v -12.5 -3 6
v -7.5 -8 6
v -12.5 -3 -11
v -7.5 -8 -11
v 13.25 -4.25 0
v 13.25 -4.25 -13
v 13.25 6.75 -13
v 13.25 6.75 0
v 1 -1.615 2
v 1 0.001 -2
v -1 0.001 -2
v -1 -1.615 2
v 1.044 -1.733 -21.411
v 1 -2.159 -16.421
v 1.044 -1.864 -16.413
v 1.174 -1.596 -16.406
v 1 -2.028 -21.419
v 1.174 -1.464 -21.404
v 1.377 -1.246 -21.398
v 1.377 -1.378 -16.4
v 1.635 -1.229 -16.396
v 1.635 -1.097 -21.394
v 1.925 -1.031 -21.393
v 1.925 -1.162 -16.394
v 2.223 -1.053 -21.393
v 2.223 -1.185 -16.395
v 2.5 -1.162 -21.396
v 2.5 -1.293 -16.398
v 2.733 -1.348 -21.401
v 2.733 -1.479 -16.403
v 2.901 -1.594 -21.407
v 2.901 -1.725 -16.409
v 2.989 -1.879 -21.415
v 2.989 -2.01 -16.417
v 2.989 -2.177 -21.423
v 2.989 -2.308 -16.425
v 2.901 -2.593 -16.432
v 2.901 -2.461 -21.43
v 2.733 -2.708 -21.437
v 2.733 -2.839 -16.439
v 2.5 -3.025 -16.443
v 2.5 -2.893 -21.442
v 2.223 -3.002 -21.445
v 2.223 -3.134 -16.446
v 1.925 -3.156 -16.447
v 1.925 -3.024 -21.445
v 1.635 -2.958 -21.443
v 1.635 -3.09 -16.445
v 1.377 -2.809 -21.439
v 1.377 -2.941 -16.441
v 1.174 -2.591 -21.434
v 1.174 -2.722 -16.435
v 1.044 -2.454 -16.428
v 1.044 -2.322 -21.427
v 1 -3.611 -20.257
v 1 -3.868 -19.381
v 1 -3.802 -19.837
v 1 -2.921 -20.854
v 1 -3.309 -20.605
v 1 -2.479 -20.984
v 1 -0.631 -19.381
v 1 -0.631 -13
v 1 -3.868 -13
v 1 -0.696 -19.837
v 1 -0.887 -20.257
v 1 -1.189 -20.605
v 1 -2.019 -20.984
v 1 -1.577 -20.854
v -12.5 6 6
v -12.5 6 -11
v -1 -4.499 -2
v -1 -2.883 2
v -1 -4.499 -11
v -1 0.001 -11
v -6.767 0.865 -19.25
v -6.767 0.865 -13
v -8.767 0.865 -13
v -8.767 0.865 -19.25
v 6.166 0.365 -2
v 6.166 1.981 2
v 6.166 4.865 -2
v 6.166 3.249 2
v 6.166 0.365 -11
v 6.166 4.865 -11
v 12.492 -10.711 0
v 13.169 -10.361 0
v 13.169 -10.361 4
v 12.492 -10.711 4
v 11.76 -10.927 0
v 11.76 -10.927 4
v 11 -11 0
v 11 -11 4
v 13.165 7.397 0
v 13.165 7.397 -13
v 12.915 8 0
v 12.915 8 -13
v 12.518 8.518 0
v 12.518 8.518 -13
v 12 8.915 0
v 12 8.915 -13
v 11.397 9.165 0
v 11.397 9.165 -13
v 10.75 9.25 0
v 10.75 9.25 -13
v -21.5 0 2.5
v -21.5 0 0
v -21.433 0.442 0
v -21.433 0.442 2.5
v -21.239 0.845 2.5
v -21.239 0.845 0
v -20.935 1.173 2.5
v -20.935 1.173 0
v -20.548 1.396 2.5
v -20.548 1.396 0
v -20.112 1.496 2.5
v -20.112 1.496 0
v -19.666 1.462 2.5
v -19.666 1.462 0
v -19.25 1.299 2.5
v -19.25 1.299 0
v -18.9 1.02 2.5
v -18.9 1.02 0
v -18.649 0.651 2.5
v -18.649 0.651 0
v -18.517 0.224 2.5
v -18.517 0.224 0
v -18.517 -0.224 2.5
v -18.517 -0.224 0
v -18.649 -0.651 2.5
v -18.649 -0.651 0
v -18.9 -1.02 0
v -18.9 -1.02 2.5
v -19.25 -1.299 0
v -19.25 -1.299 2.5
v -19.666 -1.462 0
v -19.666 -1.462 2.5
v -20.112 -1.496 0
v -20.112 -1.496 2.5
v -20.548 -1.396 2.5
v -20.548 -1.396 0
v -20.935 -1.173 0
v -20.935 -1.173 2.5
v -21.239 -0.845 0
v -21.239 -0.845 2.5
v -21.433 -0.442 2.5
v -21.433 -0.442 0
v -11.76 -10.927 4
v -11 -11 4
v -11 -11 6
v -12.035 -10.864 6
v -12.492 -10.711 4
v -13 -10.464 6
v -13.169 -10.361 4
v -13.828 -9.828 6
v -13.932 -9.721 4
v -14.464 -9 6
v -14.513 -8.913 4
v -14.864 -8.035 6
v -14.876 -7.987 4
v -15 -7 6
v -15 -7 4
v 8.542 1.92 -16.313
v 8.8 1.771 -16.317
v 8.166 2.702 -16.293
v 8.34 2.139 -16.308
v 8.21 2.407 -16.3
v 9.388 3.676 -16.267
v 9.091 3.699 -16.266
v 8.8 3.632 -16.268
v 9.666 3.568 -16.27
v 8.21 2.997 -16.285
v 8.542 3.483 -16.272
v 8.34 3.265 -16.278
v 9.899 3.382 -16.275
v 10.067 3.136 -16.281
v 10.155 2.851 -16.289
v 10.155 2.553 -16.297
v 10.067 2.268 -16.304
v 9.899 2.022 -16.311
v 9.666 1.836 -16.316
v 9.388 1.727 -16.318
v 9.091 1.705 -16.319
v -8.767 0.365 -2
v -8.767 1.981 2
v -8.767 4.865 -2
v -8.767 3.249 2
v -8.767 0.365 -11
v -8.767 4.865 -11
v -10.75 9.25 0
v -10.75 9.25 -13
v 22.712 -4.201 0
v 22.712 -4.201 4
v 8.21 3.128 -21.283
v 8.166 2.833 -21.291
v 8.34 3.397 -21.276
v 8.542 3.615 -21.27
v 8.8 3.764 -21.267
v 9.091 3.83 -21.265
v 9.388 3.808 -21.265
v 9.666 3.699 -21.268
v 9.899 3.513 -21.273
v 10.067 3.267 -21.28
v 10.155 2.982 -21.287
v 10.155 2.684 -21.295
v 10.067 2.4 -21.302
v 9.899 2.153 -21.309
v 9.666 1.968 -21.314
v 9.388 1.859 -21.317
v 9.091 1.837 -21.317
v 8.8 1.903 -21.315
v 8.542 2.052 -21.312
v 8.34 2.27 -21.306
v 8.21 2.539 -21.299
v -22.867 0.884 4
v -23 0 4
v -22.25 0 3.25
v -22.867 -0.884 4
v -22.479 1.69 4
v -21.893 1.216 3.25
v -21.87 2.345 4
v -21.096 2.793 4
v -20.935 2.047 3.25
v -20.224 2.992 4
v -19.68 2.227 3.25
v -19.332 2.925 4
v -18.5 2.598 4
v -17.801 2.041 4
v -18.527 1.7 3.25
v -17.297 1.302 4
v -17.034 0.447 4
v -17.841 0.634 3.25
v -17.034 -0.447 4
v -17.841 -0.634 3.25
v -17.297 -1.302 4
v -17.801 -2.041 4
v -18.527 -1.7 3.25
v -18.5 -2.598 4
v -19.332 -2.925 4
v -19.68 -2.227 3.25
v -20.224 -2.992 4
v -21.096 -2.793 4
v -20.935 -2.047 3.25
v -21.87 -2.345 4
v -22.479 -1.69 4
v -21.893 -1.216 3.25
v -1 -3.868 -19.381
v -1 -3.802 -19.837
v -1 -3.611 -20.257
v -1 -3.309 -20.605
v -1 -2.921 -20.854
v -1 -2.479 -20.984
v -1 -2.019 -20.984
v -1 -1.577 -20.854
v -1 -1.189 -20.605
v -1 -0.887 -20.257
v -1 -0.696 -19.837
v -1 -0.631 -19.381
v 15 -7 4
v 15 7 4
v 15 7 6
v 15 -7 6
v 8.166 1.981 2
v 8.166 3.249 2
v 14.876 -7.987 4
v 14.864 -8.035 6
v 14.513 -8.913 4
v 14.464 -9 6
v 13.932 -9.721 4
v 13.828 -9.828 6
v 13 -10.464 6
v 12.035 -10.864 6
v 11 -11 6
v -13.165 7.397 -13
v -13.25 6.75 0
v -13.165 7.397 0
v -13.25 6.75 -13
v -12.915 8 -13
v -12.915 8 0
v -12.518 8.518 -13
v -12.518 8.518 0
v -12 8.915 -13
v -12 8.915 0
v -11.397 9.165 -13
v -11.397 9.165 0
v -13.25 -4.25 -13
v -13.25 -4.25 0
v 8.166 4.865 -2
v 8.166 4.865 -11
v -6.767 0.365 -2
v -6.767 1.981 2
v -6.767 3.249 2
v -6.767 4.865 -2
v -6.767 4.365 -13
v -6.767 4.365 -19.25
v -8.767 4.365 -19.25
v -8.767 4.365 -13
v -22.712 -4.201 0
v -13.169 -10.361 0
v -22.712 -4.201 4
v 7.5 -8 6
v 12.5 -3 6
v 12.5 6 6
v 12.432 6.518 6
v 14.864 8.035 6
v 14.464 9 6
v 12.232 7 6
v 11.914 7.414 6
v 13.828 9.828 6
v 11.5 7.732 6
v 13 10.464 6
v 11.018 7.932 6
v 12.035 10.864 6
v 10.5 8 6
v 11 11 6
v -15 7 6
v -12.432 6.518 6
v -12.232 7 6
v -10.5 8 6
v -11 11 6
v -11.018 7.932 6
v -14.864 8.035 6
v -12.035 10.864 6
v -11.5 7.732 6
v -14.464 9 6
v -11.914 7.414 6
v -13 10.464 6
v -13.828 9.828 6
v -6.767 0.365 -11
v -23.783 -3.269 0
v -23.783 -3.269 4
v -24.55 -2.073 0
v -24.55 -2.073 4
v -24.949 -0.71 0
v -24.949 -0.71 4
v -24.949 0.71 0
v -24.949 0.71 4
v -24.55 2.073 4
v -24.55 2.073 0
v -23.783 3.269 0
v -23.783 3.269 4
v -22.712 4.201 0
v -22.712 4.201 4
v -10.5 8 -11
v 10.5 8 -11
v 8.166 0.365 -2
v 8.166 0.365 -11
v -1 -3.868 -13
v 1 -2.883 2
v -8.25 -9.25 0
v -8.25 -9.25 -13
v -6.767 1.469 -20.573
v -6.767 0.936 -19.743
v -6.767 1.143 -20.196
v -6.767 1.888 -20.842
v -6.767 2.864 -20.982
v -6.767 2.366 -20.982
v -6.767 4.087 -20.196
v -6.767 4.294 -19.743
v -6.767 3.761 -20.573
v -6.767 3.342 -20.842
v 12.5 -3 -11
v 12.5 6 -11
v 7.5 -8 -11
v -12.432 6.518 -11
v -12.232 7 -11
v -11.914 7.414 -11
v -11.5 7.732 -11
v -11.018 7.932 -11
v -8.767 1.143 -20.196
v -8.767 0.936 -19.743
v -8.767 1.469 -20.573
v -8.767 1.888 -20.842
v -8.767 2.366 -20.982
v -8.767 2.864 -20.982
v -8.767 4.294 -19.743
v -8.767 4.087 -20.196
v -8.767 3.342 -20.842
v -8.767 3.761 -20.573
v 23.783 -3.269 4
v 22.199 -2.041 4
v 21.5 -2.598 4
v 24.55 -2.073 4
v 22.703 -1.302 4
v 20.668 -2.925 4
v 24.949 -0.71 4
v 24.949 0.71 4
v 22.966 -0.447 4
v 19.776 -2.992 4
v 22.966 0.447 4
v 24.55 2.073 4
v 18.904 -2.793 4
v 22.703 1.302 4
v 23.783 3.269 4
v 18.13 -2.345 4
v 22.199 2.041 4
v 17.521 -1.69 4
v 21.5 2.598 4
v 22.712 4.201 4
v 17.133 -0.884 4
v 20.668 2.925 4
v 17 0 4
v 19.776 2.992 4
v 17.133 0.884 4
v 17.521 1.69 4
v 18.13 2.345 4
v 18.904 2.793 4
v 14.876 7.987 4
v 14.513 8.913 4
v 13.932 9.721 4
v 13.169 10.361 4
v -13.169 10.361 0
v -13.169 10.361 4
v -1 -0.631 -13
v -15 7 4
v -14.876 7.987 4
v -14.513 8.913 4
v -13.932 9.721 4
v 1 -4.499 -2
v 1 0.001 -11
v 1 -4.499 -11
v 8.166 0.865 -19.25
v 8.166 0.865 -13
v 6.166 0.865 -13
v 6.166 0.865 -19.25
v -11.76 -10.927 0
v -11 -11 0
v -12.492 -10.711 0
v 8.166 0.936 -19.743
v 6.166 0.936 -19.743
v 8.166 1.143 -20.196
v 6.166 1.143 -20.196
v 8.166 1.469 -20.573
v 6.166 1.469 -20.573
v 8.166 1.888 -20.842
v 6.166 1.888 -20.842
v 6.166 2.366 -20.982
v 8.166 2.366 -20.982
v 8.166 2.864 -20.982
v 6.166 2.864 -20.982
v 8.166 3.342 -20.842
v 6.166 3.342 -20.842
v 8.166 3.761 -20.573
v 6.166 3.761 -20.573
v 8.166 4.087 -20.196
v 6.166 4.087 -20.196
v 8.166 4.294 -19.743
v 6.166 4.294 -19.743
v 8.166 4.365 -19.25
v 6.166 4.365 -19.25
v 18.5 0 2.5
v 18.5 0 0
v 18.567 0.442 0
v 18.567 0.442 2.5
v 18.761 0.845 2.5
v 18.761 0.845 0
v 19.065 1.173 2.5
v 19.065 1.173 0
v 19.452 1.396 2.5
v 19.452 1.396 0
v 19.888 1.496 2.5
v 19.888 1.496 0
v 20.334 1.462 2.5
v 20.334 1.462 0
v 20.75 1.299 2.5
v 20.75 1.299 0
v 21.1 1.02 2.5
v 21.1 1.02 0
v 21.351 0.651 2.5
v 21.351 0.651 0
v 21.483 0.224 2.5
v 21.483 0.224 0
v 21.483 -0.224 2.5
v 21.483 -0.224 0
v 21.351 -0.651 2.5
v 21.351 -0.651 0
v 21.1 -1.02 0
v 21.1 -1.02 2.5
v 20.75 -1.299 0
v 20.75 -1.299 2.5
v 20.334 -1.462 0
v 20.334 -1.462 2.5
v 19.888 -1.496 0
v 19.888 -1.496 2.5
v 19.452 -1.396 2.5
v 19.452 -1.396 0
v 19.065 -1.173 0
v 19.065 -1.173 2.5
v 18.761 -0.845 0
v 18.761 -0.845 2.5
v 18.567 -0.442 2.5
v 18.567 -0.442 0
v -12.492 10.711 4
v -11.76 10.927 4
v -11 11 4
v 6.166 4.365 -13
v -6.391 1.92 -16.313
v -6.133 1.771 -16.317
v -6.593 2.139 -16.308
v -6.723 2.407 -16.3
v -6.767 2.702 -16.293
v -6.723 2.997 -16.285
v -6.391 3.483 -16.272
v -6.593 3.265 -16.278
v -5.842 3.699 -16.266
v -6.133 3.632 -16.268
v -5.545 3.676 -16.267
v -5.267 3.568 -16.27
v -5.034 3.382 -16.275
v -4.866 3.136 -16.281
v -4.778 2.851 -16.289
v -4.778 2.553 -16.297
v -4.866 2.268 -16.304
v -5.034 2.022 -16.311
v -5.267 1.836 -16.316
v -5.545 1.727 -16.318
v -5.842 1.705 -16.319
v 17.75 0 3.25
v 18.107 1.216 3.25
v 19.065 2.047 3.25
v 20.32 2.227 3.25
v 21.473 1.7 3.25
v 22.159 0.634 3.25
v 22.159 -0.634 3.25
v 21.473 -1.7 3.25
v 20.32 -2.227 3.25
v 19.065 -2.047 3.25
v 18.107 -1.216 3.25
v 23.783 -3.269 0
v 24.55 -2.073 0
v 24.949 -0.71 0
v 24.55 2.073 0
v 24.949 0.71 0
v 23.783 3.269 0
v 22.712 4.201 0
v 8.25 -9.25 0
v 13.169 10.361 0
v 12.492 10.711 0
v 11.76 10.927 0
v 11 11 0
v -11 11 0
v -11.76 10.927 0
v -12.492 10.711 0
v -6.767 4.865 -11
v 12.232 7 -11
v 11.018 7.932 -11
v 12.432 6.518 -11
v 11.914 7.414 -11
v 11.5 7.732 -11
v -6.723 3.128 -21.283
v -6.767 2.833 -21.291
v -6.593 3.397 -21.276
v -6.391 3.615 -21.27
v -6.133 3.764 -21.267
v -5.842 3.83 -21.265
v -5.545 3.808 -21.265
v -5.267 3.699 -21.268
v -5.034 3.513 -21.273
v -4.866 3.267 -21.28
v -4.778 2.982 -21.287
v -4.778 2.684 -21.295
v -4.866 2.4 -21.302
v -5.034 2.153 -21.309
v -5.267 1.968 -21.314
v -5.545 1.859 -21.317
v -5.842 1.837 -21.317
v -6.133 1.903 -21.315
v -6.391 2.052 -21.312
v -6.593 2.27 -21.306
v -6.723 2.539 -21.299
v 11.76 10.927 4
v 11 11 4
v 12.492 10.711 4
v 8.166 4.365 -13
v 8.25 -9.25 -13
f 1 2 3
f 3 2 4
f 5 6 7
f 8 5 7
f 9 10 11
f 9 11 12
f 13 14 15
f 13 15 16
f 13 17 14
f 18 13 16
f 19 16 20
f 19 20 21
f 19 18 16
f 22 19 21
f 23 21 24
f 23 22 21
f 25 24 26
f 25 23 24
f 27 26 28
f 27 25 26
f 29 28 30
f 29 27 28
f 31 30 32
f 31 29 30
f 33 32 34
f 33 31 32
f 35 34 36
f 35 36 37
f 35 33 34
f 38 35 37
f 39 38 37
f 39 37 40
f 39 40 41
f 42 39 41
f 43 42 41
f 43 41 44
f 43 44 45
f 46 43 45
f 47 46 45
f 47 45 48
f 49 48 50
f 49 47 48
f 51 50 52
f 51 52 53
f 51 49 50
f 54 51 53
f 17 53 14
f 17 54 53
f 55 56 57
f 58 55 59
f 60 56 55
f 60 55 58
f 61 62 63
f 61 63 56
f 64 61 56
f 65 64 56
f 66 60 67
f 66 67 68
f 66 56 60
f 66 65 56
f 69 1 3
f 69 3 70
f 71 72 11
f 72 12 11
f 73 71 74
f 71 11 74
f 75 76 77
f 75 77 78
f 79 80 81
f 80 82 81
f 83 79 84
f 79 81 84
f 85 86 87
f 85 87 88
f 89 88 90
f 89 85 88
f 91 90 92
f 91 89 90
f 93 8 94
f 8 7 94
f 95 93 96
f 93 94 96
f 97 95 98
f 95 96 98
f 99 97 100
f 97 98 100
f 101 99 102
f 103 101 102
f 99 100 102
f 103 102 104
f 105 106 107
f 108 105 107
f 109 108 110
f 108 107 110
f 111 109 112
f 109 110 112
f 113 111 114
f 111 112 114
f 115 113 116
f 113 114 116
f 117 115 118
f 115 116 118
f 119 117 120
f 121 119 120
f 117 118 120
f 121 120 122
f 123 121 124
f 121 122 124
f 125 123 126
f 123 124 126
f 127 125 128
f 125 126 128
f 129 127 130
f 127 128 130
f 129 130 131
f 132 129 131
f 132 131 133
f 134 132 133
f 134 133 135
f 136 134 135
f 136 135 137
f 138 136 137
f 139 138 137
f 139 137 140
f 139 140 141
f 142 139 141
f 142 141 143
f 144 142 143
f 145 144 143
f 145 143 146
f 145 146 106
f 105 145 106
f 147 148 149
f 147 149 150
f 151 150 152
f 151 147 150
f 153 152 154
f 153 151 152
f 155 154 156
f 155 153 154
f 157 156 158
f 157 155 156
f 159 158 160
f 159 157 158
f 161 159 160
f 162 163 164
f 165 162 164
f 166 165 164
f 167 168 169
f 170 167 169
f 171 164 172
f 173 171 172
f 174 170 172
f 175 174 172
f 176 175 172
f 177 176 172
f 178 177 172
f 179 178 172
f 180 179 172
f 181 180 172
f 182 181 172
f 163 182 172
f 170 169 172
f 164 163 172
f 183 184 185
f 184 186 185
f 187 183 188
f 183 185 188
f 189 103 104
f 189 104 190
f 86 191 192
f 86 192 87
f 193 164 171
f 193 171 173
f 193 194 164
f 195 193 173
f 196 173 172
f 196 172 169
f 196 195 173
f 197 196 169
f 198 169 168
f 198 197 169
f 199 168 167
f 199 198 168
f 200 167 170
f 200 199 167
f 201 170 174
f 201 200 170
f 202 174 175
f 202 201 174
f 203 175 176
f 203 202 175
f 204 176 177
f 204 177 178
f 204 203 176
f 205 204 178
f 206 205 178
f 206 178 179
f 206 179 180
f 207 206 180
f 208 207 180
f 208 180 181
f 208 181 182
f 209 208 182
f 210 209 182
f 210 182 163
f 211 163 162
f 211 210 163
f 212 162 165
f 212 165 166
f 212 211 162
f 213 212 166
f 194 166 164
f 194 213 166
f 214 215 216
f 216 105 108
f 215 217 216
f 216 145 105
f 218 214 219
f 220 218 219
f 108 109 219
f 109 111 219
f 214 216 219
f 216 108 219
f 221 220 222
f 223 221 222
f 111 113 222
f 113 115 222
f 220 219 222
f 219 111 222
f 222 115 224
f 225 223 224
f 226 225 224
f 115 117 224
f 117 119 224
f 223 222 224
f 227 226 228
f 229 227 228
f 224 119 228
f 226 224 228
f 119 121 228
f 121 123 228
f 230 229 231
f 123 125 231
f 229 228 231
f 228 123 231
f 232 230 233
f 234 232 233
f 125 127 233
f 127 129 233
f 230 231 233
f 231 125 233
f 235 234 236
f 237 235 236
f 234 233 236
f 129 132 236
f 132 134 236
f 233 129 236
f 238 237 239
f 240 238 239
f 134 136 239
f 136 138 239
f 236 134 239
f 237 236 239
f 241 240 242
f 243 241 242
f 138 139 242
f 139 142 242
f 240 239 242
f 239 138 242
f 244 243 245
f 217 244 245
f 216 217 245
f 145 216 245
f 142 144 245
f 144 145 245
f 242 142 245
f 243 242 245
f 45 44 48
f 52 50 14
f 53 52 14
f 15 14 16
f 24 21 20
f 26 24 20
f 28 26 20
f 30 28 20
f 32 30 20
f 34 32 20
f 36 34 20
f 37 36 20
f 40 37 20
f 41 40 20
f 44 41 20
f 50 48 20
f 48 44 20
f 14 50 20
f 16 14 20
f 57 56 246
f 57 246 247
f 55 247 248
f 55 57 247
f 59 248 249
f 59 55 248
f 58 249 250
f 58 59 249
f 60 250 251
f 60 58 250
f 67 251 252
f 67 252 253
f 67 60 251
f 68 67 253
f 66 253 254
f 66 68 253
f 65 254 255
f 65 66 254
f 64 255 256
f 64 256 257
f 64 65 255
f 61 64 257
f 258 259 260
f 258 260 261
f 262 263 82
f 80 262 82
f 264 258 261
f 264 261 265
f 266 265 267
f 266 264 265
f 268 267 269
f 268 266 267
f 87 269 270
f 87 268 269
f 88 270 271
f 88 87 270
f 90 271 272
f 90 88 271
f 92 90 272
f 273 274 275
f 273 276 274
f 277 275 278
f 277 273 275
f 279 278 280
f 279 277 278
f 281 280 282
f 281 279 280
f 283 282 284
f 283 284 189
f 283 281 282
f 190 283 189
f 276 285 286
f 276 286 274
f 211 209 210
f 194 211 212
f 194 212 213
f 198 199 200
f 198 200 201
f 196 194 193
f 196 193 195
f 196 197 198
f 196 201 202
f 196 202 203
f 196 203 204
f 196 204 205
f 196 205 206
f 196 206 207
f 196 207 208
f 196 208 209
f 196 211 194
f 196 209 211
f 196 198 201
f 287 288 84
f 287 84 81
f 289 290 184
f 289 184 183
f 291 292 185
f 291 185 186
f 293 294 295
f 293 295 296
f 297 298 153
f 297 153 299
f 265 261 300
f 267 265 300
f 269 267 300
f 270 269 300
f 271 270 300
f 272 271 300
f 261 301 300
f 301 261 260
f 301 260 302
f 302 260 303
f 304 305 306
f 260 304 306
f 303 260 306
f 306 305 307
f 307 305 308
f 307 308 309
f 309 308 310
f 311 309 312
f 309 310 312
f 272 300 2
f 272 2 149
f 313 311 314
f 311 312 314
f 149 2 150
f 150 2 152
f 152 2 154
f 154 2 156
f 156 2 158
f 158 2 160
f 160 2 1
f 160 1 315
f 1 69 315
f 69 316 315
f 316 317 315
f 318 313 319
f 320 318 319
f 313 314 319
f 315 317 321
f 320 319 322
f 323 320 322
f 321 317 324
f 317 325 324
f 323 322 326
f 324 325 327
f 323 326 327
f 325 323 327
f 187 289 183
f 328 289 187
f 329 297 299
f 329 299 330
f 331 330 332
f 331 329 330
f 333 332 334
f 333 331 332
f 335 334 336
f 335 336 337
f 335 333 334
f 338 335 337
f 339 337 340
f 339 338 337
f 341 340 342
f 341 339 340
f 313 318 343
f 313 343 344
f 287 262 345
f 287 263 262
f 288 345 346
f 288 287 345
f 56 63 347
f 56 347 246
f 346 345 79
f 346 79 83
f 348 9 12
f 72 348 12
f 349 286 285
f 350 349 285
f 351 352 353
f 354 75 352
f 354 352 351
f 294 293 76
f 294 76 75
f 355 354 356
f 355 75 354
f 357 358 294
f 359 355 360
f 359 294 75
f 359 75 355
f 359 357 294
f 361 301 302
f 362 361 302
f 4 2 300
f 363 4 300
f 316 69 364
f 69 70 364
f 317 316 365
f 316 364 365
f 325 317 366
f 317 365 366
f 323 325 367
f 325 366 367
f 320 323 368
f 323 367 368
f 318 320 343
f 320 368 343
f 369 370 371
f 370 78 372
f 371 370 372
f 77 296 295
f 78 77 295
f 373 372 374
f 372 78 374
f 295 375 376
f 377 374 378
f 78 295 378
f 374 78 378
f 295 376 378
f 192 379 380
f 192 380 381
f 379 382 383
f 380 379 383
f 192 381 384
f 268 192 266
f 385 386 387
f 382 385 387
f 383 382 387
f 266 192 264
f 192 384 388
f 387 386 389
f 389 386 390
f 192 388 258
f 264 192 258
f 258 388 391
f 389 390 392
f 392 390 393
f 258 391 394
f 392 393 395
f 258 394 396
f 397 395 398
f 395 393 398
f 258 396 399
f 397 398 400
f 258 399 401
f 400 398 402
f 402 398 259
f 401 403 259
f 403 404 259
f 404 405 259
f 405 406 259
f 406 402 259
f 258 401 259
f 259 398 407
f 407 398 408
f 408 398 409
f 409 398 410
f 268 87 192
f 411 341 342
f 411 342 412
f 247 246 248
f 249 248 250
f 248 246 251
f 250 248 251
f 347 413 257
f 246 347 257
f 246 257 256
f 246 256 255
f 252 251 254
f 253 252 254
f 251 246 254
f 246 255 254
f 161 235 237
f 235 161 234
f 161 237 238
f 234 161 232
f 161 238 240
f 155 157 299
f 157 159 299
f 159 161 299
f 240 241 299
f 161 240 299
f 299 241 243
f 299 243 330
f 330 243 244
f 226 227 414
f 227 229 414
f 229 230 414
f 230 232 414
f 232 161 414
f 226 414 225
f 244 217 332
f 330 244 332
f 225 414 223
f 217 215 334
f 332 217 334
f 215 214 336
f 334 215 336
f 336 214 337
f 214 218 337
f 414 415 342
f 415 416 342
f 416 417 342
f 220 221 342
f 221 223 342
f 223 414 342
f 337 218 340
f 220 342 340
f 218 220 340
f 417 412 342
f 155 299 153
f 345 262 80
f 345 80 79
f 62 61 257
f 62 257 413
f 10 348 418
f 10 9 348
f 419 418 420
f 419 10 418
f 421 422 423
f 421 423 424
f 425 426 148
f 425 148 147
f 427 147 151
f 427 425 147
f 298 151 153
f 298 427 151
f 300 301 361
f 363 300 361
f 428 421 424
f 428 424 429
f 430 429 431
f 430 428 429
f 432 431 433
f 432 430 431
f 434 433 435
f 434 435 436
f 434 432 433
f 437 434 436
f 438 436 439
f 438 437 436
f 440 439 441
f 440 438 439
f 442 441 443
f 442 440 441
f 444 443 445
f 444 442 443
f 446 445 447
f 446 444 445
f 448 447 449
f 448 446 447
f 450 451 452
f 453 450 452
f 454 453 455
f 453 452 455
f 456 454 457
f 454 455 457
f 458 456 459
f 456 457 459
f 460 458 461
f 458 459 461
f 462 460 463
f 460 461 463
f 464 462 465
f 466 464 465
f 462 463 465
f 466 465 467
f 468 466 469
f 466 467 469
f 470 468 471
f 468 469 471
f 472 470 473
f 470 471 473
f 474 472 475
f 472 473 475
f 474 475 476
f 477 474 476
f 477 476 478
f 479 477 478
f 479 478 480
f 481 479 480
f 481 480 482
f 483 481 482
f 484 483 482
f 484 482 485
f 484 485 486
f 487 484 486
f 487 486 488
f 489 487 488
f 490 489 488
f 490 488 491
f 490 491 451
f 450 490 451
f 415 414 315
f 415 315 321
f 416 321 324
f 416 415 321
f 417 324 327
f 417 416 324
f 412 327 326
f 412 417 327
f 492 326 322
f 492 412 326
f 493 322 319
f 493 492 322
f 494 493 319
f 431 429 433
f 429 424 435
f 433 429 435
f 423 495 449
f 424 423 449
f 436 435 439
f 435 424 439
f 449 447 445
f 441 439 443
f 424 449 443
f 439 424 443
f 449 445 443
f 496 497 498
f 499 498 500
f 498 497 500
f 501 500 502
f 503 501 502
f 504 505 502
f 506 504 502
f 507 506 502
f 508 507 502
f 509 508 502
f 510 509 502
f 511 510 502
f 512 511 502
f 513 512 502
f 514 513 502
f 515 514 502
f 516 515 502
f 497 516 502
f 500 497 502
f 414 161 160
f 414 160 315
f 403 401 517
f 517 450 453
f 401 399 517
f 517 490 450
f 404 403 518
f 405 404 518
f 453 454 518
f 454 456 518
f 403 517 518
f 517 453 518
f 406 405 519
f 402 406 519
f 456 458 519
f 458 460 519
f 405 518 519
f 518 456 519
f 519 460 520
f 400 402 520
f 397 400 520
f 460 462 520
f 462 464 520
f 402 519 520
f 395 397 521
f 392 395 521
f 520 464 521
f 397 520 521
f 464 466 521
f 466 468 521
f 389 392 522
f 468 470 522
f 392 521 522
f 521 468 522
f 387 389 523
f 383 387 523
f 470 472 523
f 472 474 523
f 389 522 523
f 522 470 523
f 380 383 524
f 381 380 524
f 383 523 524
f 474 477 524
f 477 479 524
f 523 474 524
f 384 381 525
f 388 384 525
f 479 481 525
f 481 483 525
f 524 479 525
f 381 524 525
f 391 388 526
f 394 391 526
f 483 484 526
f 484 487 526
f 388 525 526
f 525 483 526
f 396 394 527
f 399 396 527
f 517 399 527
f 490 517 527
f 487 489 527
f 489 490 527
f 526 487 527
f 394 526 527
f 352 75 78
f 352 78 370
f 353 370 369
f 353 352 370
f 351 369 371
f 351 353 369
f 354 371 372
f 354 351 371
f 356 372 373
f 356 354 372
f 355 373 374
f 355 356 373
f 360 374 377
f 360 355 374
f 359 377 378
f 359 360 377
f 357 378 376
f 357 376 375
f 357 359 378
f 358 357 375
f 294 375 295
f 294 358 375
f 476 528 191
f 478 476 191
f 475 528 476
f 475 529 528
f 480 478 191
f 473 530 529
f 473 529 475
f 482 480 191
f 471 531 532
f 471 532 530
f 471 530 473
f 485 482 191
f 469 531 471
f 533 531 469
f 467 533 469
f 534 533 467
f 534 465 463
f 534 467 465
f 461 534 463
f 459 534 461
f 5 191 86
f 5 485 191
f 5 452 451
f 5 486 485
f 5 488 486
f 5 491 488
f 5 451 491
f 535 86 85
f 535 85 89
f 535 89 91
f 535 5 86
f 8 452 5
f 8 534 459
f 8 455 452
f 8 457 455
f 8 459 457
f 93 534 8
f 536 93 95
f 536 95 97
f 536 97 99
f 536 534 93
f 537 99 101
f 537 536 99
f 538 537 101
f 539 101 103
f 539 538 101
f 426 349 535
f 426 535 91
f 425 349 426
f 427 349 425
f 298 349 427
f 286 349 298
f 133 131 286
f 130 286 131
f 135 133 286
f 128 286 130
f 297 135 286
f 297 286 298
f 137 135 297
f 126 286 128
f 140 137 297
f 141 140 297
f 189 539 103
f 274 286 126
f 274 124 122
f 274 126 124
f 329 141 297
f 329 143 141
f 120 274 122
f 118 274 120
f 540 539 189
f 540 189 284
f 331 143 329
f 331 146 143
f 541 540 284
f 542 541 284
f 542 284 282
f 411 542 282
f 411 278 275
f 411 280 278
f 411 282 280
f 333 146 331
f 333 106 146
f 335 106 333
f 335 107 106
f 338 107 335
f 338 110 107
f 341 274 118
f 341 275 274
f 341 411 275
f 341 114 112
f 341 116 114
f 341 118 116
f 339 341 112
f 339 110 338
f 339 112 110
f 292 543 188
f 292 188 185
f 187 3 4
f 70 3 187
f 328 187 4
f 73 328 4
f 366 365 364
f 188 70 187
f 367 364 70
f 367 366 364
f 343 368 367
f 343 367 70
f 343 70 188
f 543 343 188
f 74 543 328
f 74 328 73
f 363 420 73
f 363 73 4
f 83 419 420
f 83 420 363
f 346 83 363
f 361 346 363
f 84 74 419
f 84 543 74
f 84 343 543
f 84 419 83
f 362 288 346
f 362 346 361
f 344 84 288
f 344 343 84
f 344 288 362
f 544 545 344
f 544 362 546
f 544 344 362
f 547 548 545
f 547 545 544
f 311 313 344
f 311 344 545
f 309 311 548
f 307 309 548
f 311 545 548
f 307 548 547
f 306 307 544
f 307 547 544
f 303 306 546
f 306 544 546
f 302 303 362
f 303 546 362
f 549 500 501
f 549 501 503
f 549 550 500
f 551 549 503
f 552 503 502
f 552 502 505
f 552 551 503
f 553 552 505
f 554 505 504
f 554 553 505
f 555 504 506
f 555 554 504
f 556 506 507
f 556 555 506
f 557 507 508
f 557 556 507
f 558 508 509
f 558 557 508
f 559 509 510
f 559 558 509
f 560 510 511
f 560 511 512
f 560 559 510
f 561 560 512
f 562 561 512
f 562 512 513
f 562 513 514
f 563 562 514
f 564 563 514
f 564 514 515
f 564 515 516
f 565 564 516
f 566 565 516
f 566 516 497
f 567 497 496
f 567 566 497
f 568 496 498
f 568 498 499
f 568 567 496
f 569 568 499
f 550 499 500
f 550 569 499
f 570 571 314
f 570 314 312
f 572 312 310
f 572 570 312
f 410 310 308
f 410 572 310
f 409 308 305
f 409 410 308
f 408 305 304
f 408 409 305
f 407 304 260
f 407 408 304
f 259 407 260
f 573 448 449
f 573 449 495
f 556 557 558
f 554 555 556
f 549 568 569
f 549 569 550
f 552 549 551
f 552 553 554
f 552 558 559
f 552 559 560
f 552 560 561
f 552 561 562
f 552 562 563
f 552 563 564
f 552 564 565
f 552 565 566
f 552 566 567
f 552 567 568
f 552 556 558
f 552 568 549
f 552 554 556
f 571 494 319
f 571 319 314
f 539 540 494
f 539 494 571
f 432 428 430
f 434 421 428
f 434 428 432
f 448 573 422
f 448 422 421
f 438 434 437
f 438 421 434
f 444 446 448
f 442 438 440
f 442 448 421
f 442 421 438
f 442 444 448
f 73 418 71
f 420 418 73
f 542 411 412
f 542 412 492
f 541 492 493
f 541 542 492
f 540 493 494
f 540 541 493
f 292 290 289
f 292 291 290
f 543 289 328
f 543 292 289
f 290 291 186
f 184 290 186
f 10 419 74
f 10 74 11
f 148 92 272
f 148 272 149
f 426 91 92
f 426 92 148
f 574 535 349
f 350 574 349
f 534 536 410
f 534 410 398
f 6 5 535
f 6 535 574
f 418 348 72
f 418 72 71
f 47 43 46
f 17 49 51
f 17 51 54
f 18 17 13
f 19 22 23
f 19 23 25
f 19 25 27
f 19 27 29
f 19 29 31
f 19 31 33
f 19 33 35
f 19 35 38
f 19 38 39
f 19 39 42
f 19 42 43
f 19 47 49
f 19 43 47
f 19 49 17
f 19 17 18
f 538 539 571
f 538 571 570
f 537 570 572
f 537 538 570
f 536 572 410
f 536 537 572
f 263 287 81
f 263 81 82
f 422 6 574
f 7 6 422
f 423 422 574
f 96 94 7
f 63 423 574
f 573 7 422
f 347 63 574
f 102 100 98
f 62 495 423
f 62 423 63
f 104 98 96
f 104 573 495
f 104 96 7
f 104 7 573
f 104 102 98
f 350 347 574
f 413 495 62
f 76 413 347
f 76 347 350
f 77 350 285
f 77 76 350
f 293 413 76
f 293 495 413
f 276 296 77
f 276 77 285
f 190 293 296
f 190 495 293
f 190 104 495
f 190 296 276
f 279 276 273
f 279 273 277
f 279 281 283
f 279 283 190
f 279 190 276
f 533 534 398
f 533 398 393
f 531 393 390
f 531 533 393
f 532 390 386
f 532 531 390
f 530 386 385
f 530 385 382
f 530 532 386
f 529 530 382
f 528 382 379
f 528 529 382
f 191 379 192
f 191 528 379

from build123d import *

# Parameters (mm, degrees)
BASE_DEPTH                       = 4
BOSS_EXTRUDE2_DEPTH              = 2
SKETCH3_W                        = 26.5
SKETCH3_H                        = 18.5
BOSS_EXTRUDE3_DEPTH              = 13
SKETCH4_W                        = 25
SKETCH4_H                        = 16
CUT_EXTRUDE1_DEPTH               = 17
GND_DEPTH                        = 2
EXTRUDE_L_DEPTH                  = 2
EXTRUDE_N_DEPTH                  = 2
MOUNT_3_0_3_DIAMETER_HOLE1_D     = 3
MOUNT_3_0_3_DIAMETER_HOLE1_DEPTH = 25
CHAMFER1_SIZE                    = 5
CHAMFER2_SIZE                    = 1.692162145
CHAMFER2_PART_2_SIZE             = 1.692162145
CHAMFER2_PART_3_SIZE             = 1.692162145
CHAMFER3_SIZE                    = 1.5
FILLET1_R                        = 2
FILLET2_R                        = 2.5
SOLDER_DEPTH                     = 2
SOLDER_DEPTH_BACK                = 3
SKETCH13_R                       = 1
SOLDER_2_DEPTH                   = 2
SOLDER_2_DEPTH_BACK              = 3
SOLDER_3_DEPTH                   = 2
SOLDER_3_DEPTH_BACK              = 3


with BuildPart() as part:
    # Sketch1 → Base (new body)
    with BuildSketch(Plane(origin=(0, 0, 0), x_dir=(-1, 0, 0), z_dir=(0, 0, -1))):
        with BuildLine():
            Line((-13.169375903, 10.360626161), (-22.711719879, 4.200782701))
            ThreePointArc((-22.711719879, 4.200782701), (-25, 0), (-22.711719879, -4.200782701))
            Line((-22.711719879, -4.200782701), (-13.169375903, -10.360626161))
            ThreePointArc((-13.169375903, -10.360626161), (-12.130817261, -10.83682842), (-11, -11))
            Line((-11, -11), (11, -11))
            ThreePointArc((11, -11), (12.130817261, -10.83682842), (13.169375903, -10.360626161))
            Line((13.169375903, -10.360626161), (22.711719879, -4.200782701))
            ThreePointArc((22.711719879, -4.200782701), (25, 0), (22.711719879, 4.200782701))
            Line((22.711719879, 4.200782701), (13.169375903, 10.360626161))
            ThreePointArc((13.169375903, 10.360626161), (12.130817261, 10.83682842), (11, 11))
            Line((11, 11), (-11, 11))
            ThreePointArc((-11, 11), (-12.130817261, 10.83682842), (-13.169375903, 10.360626161))
        make_face()
    extrude(amount=-BASE_DEPTH)

    # Sketch2 → Boss-Extrude2 (add)
    with BuildSketch(Plane.XY.offset(4)):
        with BuildLine():
            Line((11, -11), (-11, -11))
            ThreePointArc((-11, -11), (-13.828427125, -9.828427125), (-15, -7))
            Line((-15, -7), (-15, 7))
            ThreePointArc((-15, 7), (-13.828427125, 9.828427125), (-11, 11))
            Line((-11, 11), (11, 11))
            ThreePointArc((11, 11), (13.828427125, 9.828427125), (15, 7))
            Line((15, 7), (15, -7))
            ThreePointArc((15, -7), (13.828427125, -9.828427125), (11, -11))
        make_face()
    extrude(amount=BOSS_EXTRUDE2_DEPTH)

    # Sketch3 → Boss-Extrude3 (add)
    with BuildSketch(Plane(origin=(0, 0, 0), x_dir=(-1, 0, 0), z_dir=(0, 0, -1))):
        Rectangle(SKETCH3_W, SKETCH3_H)
    extrude(amount=BOSS_EXTRUDE3_DEPTH)

    # Sketch4 → Cut-Extrude1 (cut)
    with BuildSketch(Plane.XY.offset(6)):
        Rectangle(SKETCH4_W, SKETCH4_H)
    extrude(amount=-CUT_EXTRUDE1_DEPTH, mode=Mode.SUBTRACT)

    # Sketch5 → GND (add)
    with BuildSketch(Plane(origin=(1, 0, 0), x_dir=(0, 0, -1), z_dir=(1, 0, 0))):
        with BuildLine():
            Line((2, 0.000898958), (-3.56894542, -2.249101042))
            Line((-3.56894542, -2.249101042), (2, -4.499101042))
            Line((2, -4.499101042), (13, -4.499101042))
            Line((13, -4.499101042), (13, -3.867648726))
            Line((13, -3.867648726), (19.381452315, -3.867648726))
            ThreePointArc((19.381452315, -3.867648726), (21, -2.249101042), (19.381452315, -0.630553357))
            Line((19.381452315, -0.630553357), (13, -0.630553357))
            Line((13, -0.630553357), (13, 0.000898958))
            Line((13, 0.000898958), (2, 0.000898958))
        make_face()
    extrude(amount=-GND_DEPTH)

    # Sketch6 → Extrude L (add)
    with BuildSketch(Plane(origin=(-6.767244159, 0, 0), x_dir=(0, 0, -1), z_dir=(1, 0, 0))):
        with BuildLine():
            Line((2, 4.865233769), (-3.56894542, 2.615233769))
            Line((-3.56894542, 2.615233769), (2, 0.365233769))
            Line((2, 0.365233769), (12.665711597, 0.365233769))
            Line((12.665711597, 0.365233769), (12.665711597, 0.865233769))
            Line((12.665711597, 0.865233769), (19.25, 0.865233769))
            ThreePointArc((19.25, 0.865233769), (21, 2.615233769), (19.25, 4.365233769))
            Line((19.25, 4.365233769), (12.665711597, 4.365233769))
            Line((12.665711597, 4.365233769), (12.665711597, 4.865233769))
            Line((12.665711597, 4.865233769), (2, 4.865233769))
        make_face()
    extrude(amount=-EXTRUDE_L_DEPTH)

    # Sketch7 → Extrude N (add)
    with BuildSketch(Plane(origin=(8.165740402, 0, 0), x_dir=(0, 0, -1), z_dir=(1, 0, 0))):
        with BuildLine():
            Line((2, 4.865233769), (-3.56894542, 2.615233769))
            Line((-3.56894542, 2.615233769), (2, 0.365233769))
            Line((2, 0.365233769), (13, 0.365233769))
            Line((13, 0.365233769), (13, 0.865233769))
            Line((13, 0.865233769), (19.25, 0.865233769))
            ThreePointArc((19.25, 0.865233769), (21, 2.615233769), (19.25, 4.365233769))
            Line((19.25, 4.365233769), (13, 4.365233769))
            Line((13, 4.365233769), (13, 4.865233769))
            Line((13, 4.865233769), (2, 4.865233769))
        make_face()
    extrude(amount=-EXTRUDE_N_DEPTH)

    # Mount Ø3.0 (3) Diameter Hole1
    with Locations(Plane.XY.offset(4)):
        with Locations((-20, 0), (20, 0)):
            Hole(MOUNT_3_0_3_DIAMETER_HOLE1_D / 2, depth=MOUNT_3_0_3_DIAMETER_HOLE1_DEPTH)

    # Chamfer1
    chamfer1_edges = [part.edges().sort_by_distance(p)[0] for p in [
        (13.25, -9.25, -6.5),
        (-13.25, -9.25, -6.5),
        (12.5, -8, -2.5),
        (-12.5, -8, -2.5),
    ]]
    chamfer(chamfer1_edges, length=CHAMFER1_SIZE)

    # Chamfer2
    chamfer2_edges = [part.edges().sort_by_distance(p)[0] for p in [
        (0, -2.249101042, 3.56894542),
    ]]
    chamfer(chamfer2_edges, length=CHAMFER2_SIZE)

    # Chamfer2 part 2
    chamfer2_part_2_edges = [part.edges().sort_by_distance(p)[0] for p in [
        (-7.767244159, 2.615233769, 3.56894542),
    ]]
    chamfer(chamfer2_part_2_edges, length=CHAMFER2_PART_2_SIZE)

    # Chamfer2 part 3
    chamfer2_part_3_edges = [part.edges().sort_by_distance(p)[0] for p in [
        (7.165740402, 2.615233769, 3.56894542),
    ]]
    chamfer(chamfer2_part_3_edges, length=CHAMFER2_PART_3_SIZE)

    # Chamfer3
    chamfer3_edges = [part.edges().sort_by_distance(p)[0] for p in [
        (-18.5, 0, 4),
        (21.5, 0, 4),
    ]]
    chamfer(chamfer3_edges, length=CHAMFER3_SIZE)

    # Fillet1
    fillet1_edges = [part.edges().sort_by_distance(p)[0] for p in [
        (12.5, 8, -2.5),
        (-12.5, 8, -2.5),
    ]]
    fillet(fillet1_edges, radius=FILLET1_R)

    # Fillet2
    fillet2_edges = [part.edges().sort_by_distance(p)[0] for p in [
        (-13.25, 9.25, -6.5),
        (13.25, 9.25, -6.5),
    ]]
    fillet(fillet2_edges, radius=FILLET2_R)


with BuildPart() as body_2:
    # Sketch13 → Solder (new, two sides: drawn at the far end of the back side and taken through both)
    with BuildSketch(Plane(origin=(0, -0.008351756, -19.365080553), x_dir=(-1, 0, 0), z_dir=(0, 0.026303529294603365, -0.9996540023161254)).offset(-SOLDER_DEPTH_BACK)):
        with Locations((-9.165740402, 2.790101854)):
            Circle(SKETCH13_R)
    extrude(amount=SOLDER_DEPTH + SOLDER_DEPTH_BACK)


with BuildPart() as body_3:
    # Sketch13 → Solder 2 (new, two sides: drawn at the far end of the back side and taken through both)
    with BuildSketch(Plane(origin=(0, -0.008351756, -19.365080553), x_dir=(-1, 0, 0), z_dir=(0, 0.026303529294603365, -0.9996540023161254)).offset(-SOLDER_2_DEPTH_BACK)):
        with Locations((5.767244159, 2.790101854)):
            Circle(SKETCH13_R)
    extrude(amount=SOLDER_2_DEPTH + SOLDER_2_DEPTH_BACK)


with BuildPart() as body_4:
    # Sketch13 → Solder 3 (new, two sides: drawn at the far end of the back side and taken through both)
    with BuildSketch(Plane(origin=(0, -0.008351756, -19.365080553), x_dir=(-1, 0, 0), z_dir=(0, 0.026303529294603365, -0.9996540023161254)).offset(-SOLDER_3_DEPTH_BACK)):
        with Locations((-2, -2.072549909)):
            Circle(SKETCH13_R)
    extrude(amount=SOLDER_3_DEPTH + SOLDER_3_DEPTH_BACK)


solid = Compound([part.part, body_2.part, body_3.part, body_4.part])
